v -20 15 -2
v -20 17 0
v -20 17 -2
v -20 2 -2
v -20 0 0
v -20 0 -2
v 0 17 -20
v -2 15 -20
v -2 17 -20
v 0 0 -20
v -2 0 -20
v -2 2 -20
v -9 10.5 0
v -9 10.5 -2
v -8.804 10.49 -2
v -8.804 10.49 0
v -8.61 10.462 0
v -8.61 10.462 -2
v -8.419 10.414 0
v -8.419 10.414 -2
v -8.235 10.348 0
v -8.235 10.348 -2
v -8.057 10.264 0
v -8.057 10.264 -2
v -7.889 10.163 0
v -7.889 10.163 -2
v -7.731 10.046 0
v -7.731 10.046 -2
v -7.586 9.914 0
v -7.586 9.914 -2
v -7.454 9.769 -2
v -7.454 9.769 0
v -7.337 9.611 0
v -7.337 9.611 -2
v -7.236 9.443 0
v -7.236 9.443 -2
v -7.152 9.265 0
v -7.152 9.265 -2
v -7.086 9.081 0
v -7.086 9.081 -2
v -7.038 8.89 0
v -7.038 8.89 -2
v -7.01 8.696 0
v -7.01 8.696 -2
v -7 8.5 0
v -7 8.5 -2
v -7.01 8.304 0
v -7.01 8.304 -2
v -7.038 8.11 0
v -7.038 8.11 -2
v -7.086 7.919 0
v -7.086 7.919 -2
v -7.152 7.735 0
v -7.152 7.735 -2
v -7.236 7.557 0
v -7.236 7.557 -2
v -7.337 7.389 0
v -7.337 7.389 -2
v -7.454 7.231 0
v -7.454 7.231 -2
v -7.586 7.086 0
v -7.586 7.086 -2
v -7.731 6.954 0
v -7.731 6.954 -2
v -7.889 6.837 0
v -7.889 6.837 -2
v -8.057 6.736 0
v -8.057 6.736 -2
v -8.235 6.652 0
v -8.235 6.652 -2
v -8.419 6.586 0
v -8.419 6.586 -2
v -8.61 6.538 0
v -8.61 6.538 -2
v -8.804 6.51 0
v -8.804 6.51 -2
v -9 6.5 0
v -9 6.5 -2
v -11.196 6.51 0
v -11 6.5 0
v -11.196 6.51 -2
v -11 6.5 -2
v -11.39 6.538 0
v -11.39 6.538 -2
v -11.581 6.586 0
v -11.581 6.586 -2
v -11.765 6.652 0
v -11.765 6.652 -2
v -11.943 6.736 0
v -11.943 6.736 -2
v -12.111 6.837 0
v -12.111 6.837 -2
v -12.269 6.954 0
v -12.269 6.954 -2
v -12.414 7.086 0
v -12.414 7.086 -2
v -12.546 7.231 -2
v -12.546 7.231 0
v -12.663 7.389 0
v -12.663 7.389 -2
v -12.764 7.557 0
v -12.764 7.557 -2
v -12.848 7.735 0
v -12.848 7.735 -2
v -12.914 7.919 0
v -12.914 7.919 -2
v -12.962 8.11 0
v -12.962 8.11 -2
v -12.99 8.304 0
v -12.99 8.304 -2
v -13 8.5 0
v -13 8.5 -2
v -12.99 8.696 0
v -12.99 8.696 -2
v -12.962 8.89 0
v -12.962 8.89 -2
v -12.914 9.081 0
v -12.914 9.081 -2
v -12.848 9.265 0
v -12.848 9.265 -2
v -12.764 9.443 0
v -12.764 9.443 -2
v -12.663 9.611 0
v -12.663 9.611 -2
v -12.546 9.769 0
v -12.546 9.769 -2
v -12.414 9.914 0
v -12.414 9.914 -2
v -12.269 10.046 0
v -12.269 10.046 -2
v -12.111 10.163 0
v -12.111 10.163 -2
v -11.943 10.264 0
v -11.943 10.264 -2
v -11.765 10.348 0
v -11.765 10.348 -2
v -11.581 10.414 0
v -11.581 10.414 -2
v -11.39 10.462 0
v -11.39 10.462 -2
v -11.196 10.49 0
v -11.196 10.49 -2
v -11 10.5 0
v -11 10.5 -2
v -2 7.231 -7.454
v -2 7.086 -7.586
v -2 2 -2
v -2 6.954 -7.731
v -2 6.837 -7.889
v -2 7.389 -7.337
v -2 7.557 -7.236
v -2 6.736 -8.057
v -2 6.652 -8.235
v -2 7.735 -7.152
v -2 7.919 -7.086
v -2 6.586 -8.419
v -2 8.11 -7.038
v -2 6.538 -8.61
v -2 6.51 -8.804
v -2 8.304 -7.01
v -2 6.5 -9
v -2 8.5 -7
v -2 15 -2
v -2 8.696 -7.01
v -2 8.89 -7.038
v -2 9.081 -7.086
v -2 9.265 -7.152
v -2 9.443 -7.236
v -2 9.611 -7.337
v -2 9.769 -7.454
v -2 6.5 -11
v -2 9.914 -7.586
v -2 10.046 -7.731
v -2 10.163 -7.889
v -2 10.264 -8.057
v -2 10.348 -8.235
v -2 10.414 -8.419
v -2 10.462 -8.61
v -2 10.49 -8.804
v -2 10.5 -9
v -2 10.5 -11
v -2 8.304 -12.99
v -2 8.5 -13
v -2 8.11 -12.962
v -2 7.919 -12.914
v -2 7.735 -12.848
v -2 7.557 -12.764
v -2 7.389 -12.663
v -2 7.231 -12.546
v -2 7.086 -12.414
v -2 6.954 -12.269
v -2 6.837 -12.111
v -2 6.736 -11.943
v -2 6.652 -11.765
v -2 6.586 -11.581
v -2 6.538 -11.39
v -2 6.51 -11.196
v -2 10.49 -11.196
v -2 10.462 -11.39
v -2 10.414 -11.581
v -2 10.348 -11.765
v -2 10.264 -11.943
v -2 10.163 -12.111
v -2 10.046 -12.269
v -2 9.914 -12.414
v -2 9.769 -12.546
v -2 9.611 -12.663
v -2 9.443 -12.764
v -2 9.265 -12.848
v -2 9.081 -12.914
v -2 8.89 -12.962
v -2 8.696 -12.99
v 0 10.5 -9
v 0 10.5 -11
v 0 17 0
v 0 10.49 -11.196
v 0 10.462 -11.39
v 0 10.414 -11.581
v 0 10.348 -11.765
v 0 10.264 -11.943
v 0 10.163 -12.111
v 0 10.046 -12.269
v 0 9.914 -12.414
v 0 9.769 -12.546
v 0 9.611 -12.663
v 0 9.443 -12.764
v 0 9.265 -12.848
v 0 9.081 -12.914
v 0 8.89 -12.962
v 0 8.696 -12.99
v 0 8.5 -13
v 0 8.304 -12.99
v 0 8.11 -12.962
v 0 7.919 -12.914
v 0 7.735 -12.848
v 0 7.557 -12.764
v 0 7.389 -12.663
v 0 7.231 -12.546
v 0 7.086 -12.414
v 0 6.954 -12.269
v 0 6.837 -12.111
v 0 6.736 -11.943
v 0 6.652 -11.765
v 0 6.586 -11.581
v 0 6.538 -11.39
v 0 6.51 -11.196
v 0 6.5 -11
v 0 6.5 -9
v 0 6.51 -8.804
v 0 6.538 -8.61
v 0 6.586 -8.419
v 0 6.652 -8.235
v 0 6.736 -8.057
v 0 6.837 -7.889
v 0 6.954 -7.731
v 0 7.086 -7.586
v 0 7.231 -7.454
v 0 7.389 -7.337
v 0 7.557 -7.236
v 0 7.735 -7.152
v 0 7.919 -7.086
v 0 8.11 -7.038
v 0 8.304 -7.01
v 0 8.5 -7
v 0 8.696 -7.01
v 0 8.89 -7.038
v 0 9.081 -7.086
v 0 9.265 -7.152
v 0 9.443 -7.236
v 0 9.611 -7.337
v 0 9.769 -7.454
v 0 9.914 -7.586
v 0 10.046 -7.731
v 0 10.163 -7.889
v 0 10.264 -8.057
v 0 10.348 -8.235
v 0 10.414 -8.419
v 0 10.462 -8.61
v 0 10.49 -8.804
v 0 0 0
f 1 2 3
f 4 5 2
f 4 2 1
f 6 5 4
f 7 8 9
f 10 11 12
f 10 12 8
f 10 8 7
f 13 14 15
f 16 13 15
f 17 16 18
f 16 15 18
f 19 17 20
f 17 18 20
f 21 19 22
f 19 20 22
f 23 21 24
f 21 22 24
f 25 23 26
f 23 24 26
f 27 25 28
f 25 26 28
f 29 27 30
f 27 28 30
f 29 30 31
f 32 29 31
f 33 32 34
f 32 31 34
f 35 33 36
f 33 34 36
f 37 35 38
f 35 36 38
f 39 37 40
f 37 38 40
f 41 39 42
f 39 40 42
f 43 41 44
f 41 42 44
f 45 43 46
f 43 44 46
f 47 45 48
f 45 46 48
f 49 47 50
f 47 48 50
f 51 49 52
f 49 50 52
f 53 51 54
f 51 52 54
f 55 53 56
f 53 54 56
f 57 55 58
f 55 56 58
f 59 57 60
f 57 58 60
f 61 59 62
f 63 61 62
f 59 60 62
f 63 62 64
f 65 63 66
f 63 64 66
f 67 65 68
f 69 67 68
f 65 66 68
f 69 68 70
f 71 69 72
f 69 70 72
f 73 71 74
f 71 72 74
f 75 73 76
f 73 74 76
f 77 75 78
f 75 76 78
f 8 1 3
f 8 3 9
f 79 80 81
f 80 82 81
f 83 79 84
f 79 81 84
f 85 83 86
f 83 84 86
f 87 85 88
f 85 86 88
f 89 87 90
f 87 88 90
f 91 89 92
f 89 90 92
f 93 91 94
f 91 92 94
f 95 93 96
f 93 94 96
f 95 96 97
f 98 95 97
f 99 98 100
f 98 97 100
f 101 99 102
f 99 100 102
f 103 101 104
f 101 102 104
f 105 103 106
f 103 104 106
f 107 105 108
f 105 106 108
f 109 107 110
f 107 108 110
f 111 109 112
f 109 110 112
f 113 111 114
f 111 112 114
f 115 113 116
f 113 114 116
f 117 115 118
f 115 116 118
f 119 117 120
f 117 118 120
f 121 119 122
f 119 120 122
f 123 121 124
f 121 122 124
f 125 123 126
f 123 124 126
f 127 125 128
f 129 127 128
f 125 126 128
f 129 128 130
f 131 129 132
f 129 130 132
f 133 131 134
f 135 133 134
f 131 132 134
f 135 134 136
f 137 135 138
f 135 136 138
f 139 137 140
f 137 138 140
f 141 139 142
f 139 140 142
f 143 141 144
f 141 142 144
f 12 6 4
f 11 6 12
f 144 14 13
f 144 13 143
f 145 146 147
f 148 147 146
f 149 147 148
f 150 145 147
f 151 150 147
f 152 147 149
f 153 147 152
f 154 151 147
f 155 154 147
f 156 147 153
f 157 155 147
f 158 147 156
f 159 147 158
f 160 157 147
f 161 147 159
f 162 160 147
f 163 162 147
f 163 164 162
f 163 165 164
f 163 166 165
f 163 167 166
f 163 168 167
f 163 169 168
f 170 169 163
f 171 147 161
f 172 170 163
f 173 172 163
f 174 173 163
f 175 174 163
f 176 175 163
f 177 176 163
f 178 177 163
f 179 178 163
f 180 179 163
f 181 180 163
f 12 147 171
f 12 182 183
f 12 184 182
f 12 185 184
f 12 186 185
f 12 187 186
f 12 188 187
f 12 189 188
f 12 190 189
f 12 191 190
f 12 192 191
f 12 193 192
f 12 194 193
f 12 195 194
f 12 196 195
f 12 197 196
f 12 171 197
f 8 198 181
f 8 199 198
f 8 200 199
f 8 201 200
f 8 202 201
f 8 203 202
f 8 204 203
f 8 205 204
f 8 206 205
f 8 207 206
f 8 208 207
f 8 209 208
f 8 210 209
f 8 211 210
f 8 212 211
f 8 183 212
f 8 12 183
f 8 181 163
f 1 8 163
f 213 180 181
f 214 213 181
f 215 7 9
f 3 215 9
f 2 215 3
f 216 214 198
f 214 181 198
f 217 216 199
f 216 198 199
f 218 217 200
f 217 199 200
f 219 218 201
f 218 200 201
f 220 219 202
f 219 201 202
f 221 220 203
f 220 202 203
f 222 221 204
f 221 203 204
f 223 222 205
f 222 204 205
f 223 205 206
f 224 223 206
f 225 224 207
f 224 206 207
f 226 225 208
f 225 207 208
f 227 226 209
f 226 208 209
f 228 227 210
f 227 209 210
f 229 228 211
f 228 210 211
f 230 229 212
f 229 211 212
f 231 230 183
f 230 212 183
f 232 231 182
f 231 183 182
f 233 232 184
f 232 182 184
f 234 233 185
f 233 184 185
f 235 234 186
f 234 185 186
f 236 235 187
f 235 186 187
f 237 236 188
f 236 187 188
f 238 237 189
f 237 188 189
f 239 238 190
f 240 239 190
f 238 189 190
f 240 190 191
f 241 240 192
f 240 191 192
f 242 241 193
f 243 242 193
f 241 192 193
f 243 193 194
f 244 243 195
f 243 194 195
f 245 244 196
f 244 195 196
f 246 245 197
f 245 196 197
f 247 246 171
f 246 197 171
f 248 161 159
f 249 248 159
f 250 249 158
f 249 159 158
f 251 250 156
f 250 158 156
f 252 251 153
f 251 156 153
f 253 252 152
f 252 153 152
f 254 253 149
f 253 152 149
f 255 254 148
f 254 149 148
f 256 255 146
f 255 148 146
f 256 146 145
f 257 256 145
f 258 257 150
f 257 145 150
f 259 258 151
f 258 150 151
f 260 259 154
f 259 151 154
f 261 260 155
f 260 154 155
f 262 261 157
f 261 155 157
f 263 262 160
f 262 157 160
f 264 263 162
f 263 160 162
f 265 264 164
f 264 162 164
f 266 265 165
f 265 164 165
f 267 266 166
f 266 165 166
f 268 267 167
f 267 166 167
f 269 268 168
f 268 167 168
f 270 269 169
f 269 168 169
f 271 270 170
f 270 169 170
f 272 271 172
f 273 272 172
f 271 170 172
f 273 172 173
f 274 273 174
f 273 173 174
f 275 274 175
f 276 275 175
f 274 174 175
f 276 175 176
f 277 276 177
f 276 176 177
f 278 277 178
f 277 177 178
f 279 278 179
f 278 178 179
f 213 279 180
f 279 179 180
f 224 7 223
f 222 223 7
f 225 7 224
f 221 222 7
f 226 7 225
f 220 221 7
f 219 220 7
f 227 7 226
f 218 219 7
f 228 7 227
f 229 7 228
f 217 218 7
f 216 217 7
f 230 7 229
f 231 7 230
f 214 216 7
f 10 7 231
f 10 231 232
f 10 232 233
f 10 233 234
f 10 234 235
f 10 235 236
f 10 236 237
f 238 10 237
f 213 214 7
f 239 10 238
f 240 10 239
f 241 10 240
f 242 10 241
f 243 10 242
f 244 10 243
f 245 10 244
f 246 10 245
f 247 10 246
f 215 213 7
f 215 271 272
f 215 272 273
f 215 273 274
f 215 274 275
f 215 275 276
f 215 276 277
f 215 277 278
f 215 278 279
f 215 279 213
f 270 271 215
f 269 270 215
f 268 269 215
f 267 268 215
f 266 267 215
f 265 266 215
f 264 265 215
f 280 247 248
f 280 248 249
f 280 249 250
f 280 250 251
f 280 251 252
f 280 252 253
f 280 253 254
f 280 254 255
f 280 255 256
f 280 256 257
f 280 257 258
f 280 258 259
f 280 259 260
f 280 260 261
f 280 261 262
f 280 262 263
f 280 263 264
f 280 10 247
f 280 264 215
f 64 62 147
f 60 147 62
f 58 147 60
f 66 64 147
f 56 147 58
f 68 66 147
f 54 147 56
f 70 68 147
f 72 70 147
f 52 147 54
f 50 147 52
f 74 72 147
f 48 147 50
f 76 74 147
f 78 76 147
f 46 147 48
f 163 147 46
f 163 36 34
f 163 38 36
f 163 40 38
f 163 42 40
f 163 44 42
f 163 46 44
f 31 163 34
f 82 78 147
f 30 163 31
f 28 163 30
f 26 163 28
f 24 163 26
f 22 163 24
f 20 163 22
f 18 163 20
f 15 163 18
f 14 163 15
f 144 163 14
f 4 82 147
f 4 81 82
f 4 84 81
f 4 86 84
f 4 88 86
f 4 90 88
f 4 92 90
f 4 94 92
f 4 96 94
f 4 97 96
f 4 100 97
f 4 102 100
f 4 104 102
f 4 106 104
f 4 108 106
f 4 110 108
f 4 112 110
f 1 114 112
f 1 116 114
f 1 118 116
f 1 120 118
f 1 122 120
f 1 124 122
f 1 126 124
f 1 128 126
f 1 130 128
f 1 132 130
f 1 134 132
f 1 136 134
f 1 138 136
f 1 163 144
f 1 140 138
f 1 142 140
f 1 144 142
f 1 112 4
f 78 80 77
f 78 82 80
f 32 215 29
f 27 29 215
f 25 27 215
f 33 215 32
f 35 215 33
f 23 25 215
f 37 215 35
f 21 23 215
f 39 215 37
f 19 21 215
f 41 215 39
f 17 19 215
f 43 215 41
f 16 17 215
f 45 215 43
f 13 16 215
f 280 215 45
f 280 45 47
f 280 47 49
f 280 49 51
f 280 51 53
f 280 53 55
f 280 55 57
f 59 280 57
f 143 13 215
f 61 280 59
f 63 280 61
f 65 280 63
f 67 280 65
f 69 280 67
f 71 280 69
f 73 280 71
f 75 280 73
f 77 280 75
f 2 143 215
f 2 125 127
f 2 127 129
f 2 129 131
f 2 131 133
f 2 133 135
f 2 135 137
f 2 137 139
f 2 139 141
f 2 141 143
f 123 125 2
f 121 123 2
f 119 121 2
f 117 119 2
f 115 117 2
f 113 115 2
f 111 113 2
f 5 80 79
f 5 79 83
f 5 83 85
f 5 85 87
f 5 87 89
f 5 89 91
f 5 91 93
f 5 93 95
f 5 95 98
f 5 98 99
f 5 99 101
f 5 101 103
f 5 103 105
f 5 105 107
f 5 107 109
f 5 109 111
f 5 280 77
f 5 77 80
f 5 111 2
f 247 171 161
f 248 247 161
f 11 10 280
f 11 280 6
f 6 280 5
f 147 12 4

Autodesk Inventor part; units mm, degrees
ref_plane "YZ Plane" through (0, 0, 0) normal (1, 0, 0) x (0, 1, 0)
ref_plane "XZ Plane" through (0, 0, 0) normal (0, 1, 0) x (-1, 0, 0)
ref_plane "XY Plane" through (0, 0, 0) normal (0, 0, 1) x (1, 0, 0)
sketch "Эскиз1" plane through (0, 0, 0) normal (0, 1, 0) x (-1, 0, 0)
  line L0 (0, 0) -> (20, 0)
  line L1 (20, 0) -> (20, -20)
  line L2 (20, -20) -> (0, -20)
  line L3 (0, -20) -> (0, 0)
  line L4 (20, 0) -> (20, -2)
  line L5 (0, -20) -> (2, -20)
  line L6 (20, -2) -> (2, -20)
  dimension "d0" = 20
  dimension "d1" = 20
  dimension "d2" = 2
  dimension "d3" = 2
extrude "Выдавливание1" add sketch "Эскиз1" along normal blind 17 contours L0 L1 L6 L2 L3
sketch "Эскиз2" plane through (0, 0, -20) normal (0, 0, -1) x (-1, 0, 0)
  line L0 (0, 17) -> (2, 17) projected
  line L1 (2, 17) -> (2, 15)
  line L2 (2, 0) -> (2, 17) projected
  line L3 (2, 15) -> (20, 15)
  line L4 (20, 0) -> (20, 17) projected
  line L5 (0, 0) -> (2, 0) projected
  line L6 (2, 0) -> (2, 2)
  line L7 (2, 2) -> (20, 2)
  line L8 (20, 2) -> (20, 15)
  line L9 (2, 15) -> (2, 2)
  dimension "d6" = 2
  dimension "d7" = 2
extrude "Выдавливание2" cut sketch "Эскиз2" against normal blind 18
sketch "Эскиз3" plane through (0, 0, -2) normal (0, 0, -1) x (-1, 0, 0)
  line L0 (0, 0) -> (0, 17) projected
  line L1 (10, 10.2321) -> (10, 10.5)
  line L2 (10, 10.5) -> (11, 10.5)
  line L3 (11, 6.5) -> (9, 6.5)
  line L4 (9, 10.5) -> (10, 10.5)
  arc A0 (11, 6.5) -> (11, 10.5) centre (11, 8.5) ccw
  arc A1 (9, 10.5) -> (9, 6.5) centre (9, 8.5) ccw
  line L5 (10, 10.5) -> (10, 8.5)
  line L6 (0, 8.5) -> (7, 8.5)
  line L7 (9, 8.5) -> (10, 8.5)
  dimension "d10" = 10
  dimension "d11" = 2
  dimension "d13" = 1
extrude "Выдавливание3" cut sketch "Эскиз3" against normal blind 10
sketch "Эскиз4" plane through (-2, 2, -20) normal (-1, 0, 0) x (0, 0, 1)
  line L0 (0, 0) -> (0, 13) projected
  line L1 (0, 6.5) -> (10, 6.5)
  line L2 (10, 8.2321) -> (10, 8.5)
  line L3 (10, 8.5) -> (9, 8.5)
  line L4 (9, 4.5) -> (11, 4.5)
  line L5 (11, 8.5) -> (10, 8.5)
  arc A0 (9, 8.5) -> (9, 4.5) centre (9, 6.5) ccw
  arc A1 (11, 4.5) -> (11, 8.5) centre (11, 6.5) ccw
  point P0 (20, -2)
  dimension "d17" = 10
extrude "Выдавливание4" cut sketch "Эскиз4" against normal blind 2
properties part number "угол"
